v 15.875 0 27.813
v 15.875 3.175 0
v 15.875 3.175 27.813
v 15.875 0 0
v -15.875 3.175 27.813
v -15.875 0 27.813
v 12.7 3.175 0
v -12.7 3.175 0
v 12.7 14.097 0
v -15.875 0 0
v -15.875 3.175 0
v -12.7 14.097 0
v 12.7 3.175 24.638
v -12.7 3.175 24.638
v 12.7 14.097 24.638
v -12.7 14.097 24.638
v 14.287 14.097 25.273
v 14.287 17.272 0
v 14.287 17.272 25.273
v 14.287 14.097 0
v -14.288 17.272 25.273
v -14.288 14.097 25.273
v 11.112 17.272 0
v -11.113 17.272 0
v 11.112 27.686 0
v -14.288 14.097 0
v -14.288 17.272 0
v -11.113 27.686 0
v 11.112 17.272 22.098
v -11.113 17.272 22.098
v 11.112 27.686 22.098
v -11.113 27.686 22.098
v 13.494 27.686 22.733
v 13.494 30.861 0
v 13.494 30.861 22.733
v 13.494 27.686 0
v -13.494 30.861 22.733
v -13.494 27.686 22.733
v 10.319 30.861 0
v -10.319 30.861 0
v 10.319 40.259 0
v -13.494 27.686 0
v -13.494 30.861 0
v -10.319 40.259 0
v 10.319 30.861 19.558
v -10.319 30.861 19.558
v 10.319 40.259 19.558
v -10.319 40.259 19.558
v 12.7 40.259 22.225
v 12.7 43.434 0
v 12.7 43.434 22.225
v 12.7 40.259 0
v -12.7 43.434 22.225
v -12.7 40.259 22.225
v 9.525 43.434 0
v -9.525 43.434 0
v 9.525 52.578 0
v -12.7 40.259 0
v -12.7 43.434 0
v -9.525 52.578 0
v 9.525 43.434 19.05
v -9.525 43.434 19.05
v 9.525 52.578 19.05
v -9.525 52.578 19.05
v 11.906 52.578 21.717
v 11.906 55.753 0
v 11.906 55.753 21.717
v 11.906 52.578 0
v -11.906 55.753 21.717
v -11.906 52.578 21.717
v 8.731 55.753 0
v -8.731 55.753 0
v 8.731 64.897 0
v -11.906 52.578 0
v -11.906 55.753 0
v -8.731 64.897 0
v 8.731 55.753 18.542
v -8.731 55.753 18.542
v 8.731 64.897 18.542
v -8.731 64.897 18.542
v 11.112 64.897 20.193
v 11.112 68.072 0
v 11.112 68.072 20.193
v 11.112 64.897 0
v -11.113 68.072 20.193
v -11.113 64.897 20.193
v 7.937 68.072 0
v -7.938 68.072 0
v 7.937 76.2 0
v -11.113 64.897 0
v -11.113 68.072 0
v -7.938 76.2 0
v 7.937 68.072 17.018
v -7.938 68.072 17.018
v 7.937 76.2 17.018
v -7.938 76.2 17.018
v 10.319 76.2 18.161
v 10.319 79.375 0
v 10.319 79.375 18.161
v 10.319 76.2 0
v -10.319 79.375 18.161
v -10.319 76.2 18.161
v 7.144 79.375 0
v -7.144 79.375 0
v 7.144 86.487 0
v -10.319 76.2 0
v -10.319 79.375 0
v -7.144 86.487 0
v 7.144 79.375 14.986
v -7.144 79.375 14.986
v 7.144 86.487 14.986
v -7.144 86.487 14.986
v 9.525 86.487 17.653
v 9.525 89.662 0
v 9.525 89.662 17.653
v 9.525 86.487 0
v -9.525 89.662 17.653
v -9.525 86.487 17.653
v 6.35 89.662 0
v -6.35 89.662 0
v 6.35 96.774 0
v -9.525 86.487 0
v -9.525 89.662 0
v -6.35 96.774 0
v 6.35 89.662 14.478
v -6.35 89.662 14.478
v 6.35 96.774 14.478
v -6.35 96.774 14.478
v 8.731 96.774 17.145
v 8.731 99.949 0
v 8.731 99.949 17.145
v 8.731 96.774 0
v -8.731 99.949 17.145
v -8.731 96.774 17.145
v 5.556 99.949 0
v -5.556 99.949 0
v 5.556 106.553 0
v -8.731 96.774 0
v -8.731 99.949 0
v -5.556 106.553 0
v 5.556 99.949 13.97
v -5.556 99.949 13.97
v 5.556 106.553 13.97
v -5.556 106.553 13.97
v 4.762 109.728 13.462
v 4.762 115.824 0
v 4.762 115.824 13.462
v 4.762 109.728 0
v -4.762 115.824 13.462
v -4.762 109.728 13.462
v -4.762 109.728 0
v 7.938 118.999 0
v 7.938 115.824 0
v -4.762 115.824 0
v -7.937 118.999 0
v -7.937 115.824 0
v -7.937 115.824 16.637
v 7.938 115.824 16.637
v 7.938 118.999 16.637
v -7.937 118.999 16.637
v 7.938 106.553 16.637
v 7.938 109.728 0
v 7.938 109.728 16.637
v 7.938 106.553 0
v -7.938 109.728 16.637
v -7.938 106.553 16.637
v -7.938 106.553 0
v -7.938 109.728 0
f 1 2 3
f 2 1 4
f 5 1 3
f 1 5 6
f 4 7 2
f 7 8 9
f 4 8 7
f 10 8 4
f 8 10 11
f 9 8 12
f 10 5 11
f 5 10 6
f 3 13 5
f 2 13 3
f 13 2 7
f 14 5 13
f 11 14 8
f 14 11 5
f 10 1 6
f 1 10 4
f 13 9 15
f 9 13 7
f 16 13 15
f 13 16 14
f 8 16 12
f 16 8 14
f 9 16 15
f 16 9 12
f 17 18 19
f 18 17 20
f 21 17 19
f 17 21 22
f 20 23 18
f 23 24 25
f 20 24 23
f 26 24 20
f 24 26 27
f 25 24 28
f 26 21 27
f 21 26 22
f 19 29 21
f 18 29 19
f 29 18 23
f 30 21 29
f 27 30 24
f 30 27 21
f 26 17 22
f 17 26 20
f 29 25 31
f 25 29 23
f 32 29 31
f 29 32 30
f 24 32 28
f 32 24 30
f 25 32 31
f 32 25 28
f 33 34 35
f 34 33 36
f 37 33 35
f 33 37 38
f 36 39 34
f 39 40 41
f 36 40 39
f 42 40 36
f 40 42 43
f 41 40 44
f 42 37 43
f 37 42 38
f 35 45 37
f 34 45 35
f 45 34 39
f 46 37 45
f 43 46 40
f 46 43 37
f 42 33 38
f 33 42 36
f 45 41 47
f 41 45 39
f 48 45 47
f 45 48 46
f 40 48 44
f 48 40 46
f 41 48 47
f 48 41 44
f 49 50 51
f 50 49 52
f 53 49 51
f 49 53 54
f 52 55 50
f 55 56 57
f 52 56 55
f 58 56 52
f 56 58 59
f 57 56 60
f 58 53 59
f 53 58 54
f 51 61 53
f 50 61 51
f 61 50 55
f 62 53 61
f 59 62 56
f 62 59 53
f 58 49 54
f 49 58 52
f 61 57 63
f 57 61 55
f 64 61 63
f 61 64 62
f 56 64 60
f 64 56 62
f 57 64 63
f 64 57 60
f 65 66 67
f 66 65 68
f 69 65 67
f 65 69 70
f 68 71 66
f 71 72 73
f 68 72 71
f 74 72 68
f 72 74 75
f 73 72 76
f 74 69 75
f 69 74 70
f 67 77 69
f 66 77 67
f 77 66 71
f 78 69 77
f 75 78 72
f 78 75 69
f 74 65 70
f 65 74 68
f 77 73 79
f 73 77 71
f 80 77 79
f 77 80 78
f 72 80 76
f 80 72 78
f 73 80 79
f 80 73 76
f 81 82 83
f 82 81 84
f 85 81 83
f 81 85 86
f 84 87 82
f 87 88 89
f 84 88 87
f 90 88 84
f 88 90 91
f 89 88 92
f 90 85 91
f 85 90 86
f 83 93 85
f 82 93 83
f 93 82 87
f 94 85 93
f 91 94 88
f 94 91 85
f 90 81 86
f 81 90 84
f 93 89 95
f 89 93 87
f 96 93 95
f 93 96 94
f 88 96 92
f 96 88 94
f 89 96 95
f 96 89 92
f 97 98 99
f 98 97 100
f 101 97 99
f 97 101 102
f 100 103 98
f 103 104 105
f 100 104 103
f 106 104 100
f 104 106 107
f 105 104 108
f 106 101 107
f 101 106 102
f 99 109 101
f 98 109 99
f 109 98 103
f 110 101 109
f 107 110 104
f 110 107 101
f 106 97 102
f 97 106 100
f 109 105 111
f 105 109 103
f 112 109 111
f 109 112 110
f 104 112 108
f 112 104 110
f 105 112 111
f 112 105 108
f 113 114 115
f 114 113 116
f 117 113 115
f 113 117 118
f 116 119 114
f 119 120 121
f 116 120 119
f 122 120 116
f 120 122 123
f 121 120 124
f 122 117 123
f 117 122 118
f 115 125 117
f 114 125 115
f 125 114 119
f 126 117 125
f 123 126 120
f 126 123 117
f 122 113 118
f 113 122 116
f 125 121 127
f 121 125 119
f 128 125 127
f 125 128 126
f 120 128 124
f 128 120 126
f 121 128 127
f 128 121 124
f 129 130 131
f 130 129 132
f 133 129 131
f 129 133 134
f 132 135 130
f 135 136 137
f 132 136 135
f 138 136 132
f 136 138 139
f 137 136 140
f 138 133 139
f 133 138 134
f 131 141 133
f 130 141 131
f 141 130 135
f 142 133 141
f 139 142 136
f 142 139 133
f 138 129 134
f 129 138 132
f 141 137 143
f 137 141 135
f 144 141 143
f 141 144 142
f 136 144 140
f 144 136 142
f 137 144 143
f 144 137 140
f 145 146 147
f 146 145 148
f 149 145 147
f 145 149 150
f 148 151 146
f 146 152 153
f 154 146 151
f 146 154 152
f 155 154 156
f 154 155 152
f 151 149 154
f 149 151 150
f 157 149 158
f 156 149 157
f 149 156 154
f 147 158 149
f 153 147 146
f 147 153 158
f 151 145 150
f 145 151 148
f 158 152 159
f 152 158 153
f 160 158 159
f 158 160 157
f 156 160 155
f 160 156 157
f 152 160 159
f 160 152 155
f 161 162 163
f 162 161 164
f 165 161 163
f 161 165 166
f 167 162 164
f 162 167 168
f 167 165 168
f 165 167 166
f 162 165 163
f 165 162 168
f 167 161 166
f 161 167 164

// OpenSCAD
function in2mm (v) = v * 25.4;
function vin2mm (v) = [in2mm (v [0]), in2mm (v [1]), in2mm (v [2])];
function infrac (a, b, c) = a + (b * (1 / c));
function sum (v, l = -1, o = 0, i = 0, r = 0) = i < l ? sum (v, l, o, i + 1, r + v [i][o]) : r;

wall   = 0.125;
cube_x = 0;
cube_y = 1;
cube_h = 2;

v = [
  [infrac (1,  0, 16), 0.43, 0.82], // 1"
  [infrac (0,  7,  8), 0.41, 0.72], // 7/8"
  [infrac (0, 13, 16), 0.37, 0.62], // 13/16"
  [infrac (0,  3,  4), 0.36, 0.60], // 3/4"
  [infrac (0, 11, 16), 0.36, 0.58], // 11/16"
  [infrac (0,  5,  8), 0.32, 0.52], // 5/8"
  [infrac (0,  9, 16), 0.28, 0.44], // 9/16"
  [infrac (0,  1,  2), 0.28, 0.42], // 1/2"
  [infrac (0,  7, 16), 0.26, 0.40], // 7/16"
  [infrac (0,  3,  8), 0.24, 0.38], // 3/8"
];

for (i = [0 : len (v) - 1]) {
  translate (vin2mm ([-((v [i][cube_x] + 0.250) / 2), sum (v, i, cube_y) + (wall * i), 0])) {
    cube (vin2mm ([v [i][cube_x] + 0.250, wall, 0.15 + v [i][cube_h] + 0.125]));

    translate (vin2mm ([0.125, wall, 0])) {
      cube (vin2mm ([v [i][cube_x], v [i][cube_y], 0.15 + v [i][cube_h]]));

      if (i == len (v) - 1) {
        translate (vin2mm ([-0.125, v [i][cube_y], 0]))
          cube (vin2mm ([v [i][cube_x] + 0.250, wall, 0.15 + v [i][cube_h] + 0.125]));
      }
    }
  }
}
